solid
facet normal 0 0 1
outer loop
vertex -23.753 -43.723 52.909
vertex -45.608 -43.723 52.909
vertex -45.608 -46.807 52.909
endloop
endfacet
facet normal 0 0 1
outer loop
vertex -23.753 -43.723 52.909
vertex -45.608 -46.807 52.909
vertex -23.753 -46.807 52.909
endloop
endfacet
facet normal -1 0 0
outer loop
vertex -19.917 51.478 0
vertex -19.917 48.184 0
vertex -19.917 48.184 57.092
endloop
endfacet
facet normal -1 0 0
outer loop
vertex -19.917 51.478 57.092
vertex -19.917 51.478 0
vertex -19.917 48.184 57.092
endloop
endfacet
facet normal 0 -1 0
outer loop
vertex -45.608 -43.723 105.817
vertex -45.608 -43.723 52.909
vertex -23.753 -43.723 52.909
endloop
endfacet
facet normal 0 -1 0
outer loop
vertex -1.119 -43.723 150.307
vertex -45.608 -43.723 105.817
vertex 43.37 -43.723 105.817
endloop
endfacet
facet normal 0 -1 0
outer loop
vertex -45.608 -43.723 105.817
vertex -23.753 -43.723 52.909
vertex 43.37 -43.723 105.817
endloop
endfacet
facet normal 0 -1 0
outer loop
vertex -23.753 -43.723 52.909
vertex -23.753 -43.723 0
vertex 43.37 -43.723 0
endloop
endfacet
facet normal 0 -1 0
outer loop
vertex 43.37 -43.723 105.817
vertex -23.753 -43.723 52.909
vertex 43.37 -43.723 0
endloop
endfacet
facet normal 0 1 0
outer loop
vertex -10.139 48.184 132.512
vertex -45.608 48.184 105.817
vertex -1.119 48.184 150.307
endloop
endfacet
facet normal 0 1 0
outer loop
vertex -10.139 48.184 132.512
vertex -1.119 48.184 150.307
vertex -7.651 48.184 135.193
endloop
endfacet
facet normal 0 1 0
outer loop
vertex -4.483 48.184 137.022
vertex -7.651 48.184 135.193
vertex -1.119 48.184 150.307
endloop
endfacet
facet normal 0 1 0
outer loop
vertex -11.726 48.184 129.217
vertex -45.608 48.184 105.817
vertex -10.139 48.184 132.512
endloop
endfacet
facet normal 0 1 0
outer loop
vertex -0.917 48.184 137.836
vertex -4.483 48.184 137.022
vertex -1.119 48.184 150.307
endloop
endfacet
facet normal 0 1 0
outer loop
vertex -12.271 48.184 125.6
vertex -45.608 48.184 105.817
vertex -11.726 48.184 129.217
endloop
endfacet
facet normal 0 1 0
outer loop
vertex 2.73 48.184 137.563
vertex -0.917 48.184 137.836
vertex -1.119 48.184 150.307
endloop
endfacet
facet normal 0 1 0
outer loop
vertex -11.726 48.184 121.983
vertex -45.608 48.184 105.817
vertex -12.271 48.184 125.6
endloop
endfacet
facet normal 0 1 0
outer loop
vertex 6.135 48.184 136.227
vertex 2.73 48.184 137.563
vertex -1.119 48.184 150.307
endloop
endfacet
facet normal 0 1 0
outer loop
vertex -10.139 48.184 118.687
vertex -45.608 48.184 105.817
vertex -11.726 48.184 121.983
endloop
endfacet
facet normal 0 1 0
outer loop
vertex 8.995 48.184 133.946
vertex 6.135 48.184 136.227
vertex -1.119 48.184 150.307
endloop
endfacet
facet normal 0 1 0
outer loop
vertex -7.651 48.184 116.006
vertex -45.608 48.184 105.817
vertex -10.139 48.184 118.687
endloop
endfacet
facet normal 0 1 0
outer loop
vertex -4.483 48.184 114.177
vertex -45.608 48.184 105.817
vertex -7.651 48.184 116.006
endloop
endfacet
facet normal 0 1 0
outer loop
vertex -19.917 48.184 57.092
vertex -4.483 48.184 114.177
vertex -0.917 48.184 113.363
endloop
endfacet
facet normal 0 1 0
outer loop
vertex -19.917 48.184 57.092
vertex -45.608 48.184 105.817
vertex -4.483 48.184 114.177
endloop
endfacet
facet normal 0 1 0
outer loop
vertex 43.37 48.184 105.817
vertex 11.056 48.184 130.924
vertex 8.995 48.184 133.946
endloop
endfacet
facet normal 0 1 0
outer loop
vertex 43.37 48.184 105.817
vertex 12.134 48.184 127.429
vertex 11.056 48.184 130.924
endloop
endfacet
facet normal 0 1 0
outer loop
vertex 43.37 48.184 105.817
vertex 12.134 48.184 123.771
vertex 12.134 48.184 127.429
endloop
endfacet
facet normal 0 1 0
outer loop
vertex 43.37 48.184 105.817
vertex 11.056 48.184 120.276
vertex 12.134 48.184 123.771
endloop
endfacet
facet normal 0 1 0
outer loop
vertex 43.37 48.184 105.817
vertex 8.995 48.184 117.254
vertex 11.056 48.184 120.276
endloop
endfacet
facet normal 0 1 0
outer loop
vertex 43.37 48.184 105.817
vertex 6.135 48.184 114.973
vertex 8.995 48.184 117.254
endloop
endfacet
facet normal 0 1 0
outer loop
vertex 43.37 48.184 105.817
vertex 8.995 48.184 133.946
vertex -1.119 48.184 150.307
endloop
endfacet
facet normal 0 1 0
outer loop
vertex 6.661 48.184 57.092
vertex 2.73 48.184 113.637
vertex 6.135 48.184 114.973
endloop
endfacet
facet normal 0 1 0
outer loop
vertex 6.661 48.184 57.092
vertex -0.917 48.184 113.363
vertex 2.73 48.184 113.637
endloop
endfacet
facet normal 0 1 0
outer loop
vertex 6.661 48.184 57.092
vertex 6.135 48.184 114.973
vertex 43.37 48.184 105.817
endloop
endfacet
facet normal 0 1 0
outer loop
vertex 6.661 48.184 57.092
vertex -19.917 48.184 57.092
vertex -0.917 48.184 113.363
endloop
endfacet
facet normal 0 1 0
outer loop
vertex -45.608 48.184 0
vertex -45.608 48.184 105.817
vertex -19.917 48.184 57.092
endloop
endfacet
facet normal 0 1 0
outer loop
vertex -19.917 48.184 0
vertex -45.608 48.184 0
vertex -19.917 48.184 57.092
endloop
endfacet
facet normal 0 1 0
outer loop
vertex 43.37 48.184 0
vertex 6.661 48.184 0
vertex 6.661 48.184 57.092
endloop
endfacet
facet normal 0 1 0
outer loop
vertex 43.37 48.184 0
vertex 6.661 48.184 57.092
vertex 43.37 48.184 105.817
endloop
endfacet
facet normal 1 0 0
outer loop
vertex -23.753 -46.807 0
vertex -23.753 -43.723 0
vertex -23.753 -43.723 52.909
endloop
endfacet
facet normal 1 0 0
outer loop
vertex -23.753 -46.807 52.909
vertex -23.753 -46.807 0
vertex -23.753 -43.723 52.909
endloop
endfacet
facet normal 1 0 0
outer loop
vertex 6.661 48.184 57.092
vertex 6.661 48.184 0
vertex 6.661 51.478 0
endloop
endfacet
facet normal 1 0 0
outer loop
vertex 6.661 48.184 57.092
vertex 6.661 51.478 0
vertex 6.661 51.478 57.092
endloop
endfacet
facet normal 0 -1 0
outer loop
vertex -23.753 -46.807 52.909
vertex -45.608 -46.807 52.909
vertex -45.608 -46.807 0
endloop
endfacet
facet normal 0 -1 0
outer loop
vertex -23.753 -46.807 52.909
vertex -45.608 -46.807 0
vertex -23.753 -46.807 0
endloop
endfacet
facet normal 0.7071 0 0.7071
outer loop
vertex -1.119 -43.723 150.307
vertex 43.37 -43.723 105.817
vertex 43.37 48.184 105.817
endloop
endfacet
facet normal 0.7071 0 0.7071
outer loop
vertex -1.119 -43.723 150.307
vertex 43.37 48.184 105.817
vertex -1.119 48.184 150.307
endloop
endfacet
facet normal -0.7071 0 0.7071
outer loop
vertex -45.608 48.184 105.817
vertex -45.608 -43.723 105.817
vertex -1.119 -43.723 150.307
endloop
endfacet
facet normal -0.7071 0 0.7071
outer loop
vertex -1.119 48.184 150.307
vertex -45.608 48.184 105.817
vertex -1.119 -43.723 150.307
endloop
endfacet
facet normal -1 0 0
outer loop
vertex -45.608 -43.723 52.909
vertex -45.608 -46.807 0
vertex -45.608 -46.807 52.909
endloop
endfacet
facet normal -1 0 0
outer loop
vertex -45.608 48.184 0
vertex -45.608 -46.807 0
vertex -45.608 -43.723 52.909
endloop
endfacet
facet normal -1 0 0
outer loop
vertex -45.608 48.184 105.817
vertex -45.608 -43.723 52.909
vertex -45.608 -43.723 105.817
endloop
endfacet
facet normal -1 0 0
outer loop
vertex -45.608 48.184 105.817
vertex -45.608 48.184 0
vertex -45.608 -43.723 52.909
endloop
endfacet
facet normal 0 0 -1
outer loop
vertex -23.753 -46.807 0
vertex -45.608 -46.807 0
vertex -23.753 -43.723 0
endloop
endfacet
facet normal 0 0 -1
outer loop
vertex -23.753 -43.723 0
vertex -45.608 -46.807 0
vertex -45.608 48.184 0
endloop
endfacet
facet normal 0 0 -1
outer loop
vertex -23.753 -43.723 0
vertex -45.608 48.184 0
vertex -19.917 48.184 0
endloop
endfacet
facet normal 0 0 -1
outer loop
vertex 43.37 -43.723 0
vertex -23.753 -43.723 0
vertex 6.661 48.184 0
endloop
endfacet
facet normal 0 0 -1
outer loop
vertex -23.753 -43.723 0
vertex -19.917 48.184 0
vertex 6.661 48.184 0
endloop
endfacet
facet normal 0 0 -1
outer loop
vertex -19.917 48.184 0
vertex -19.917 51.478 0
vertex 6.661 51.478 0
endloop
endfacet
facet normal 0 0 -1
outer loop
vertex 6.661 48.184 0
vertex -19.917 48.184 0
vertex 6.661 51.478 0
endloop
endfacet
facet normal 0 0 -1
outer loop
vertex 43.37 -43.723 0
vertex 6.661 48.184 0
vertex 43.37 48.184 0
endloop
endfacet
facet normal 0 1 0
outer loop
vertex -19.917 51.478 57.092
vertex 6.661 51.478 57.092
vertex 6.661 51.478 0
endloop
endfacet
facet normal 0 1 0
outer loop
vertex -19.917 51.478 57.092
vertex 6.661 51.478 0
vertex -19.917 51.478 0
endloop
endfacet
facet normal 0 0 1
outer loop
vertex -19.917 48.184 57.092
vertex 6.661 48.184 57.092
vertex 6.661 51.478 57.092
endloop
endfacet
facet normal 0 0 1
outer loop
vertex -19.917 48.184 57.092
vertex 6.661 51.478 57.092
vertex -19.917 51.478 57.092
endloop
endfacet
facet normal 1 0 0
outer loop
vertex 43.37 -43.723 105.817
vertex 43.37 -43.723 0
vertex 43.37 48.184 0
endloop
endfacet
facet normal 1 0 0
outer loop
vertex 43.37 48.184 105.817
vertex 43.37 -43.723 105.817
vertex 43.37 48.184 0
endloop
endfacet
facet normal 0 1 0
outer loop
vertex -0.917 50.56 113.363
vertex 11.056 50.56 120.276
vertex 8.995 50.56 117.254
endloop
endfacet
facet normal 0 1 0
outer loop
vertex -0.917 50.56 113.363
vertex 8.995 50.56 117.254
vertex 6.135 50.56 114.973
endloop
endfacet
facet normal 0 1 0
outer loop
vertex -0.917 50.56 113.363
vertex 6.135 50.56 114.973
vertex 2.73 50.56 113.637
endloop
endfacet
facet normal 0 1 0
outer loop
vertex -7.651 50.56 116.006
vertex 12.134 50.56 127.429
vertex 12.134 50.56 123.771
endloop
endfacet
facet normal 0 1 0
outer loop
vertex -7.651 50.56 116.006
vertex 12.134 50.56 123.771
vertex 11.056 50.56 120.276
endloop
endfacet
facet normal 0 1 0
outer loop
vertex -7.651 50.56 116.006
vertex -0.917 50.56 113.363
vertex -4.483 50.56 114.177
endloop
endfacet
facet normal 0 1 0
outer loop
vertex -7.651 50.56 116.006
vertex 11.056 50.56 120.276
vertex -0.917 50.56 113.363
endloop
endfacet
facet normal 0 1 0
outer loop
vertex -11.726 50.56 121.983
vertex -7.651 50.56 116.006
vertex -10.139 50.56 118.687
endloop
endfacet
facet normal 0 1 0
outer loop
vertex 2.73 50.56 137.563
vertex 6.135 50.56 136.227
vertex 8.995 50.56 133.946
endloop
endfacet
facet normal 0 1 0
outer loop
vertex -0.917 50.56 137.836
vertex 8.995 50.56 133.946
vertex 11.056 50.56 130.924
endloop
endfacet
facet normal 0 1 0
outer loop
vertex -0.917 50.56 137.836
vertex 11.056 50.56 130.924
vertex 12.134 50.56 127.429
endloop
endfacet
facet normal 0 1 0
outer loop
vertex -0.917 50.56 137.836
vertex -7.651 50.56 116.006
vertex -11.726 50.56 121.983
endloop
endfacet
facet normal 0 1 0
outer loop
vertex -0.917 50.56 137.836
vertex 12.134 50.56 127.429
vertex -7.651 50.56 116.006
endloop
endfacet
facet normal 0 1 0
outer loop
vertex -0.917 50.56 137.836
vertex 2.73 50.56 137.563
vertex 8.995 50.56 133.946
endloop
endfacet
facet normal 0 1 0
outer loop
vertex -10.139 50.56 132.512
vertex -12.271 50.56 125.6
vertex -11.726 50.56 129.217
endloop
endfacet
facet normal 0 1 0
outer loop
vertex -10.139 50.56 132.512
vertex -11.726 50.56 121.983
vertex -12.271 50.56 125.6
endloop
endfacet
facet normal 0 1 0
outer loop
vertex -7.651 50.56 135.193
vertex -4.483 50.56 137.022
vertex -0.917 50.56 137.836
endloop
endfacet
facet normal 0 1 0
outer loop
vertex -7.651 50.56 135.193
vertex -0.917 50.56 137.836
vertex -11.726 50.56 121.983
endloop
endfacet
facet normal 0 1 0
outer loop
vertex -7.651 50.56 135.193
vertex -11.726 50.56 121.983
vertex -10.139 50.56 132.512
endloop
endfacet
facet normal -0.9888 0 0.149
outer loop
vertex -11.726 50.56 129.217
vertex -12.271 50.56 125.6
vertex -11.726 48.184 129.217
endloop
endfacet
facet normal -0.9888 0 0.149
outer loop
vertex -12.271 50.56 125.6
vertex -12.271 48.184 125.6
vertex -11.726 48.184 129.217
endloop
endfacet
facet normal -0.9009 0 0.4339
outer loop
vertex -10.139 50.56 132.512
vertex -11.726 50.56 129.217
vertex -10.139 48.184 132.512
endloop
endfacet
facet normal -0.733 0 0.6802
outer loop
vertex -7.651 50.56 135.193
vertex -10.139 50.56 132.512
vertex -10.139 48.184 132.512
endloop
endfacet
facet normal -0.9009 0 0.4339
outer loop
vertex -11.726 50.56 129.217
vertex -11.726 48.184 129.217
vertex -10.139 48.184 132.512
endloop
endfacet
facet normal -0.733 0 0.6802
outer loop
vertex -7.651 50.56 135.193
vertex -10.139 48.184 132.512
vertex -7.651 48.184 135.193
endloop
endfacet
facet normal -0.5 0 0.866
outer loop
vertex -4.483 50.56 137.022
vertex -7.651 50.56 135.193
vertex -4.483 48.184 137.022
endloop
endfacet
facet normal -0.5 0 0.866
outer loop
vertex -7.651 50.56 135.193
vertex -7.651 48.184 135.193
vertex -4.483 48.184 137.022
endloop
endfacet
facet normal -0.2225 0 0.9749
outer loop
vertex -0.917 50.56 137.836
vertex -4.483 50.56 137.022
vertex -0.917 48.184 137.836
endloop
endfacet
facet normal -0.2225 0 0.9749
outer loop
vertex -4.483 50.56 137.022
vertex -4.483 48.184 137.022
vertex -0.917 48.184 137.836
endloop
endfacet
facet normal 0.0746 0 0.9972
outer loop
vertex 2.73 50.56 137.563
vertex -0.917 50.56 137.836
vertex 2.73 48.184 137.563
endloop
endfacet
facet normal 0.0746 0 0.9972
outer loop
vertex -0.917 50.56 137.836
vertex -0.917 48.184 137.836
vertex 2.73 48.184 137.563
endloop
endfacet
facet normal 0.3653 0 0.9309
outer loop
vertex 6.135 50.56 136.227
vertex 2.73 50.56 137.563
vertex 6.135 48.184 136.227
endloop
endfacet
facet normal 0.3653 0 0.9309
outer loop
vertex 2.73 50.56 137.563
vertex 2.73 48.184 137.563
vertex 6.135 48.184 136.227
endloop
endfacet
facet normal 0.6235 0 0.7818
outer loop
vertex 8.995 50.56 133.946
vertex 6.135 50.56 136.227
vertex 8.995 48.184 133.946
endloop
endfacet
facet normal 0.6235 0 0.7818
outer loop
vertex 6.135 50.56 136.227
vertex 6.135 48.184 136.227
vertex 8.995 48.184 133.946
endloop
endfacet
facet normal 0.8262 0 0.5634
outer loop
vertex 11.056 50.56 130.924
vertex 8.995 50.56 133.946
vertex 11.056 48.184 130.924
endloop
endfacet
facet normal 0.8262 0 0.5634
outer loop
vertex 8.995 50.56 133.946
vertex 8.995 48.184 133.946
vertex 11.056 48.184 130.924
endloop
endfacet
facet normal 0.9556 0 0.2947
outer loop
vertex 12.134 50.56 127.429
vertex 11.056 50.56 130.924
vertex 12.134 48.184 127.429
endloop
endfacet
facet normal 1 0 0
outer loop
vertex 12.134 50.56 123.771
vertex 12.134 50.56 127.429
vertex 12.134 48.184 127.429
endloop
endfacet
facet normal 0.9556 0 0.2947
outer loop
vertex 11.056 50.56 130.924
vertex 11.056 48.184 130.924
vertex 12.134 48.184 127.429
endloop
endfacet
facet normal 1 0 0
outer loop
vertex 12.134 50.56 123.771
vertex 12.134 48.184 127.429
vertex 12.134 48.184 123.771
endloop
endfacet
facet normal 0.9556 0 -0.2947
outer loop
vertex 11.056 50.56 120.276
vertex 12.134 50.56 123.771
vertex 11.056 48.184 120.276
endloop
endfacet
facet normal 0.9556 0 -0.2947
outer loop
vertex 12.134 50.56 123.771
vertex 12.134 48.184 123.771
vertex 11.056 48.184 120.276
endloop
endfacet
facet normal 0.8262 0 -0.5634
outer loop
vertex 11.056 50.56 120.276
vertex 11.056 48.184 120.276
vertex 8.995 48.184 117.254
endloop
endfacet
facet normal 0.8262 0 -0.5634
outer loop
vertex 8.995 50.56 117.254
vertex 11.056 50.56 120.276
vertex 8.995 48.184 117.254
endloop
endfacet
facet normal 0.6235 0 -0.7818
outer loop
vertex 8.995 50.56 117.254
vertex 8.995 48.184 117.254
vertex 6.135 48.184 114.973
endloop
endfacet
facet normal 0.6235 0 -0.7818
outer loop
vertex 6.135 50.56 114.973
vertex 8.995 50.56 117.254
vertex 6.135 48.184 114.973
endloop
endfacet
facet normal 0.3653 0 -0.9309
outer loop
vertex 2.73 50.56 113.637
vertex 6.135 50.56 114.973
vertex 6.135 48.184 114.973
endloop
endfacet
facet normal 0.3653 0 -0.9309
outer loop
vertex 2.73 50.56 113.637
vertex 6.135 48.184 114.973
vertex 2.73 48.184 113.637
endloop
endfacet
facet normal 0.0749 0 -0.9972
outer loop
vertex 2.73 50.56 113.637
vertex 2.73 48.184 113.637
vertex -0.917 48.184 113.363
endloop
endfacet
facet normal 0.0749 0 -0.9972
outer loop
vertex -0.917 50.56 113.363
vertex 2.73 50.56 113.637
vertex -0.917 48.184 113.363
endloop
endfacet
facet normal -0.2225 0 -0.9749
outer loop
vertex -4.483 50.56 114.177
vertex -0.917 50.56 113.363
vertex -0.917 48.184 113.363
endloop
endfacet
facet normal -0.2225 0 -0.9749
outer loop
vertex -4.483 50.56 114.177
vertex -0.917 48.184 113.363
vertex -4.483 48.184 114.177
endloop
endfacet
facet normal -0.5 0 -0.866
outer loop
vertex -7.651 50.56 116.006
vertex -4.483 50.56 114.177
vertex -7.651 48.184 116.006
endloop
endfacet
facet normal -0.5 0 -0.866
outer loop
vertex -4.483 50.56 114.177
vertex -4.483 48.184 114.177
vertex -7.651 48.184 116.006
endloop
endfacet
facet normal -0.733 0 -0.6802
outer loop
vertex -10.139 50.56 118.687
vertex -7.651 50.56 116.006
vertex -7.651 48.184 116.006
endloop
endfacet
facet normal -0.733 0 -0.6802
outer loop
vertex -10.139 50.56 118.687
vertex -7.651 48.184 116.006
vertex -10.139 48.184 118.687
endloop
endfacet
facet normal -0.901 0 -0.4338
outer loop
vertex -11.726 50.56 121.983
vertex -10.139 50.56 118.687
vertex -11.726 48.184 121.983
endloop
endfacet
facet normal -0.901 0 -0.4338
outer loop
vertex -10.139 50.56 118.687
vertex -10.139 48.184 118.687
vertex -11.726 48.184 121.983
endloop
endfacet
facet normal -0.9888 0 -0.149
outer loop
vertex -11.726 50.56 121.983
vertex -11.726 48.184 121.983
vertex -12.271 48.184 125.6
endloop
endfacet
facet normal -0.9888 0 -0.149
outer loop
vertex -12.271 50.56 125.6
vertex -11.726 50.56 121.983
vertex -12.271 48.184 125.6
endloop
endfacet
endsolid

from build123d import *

# Parameters (mm, degrees)
F0_W        = 88.978625834
F0_H        = 91.9070094824
F1_DEPTH    = 92.0228585601
F2_W        = 88.978625834
F2_H        = 91.9070094824
F3_DEPTH    = 64.5945444703
F4_T1_DEPTH = 353.1900010597
F5_W        = 26.5779765323
F5_H        = 57.0915937424
F6_DEPTH    = 3.2936800271
F8_W        = 21.8550208956
F8_H        = 52.9087015152
F9_DEPTH    = 3.0834991485
F10_R       = 12.2707310255
F11_DEPTH   = 1.7256960273
F12_DEPTH   = 0.6503686309


# Not quite as in the source:
# - a fillet or chamfer that OpenCascade refuses, or shapes differently, is made with other operations: its cross-section is extruded or revolved along the edge and cut away or added


with BuildPart() as f1:
    # F0 (on Top) → F1 (new body)
    with BuildSketch(Plane.XY):
        with Locations((-1.1190511286, 2.2303946316)):
            Rectangle(F0_W, F0_H)
    extrude(amount=F1_DEPTH)

    # F2 (on face) → F3 (join)
    with BuildSketch(Plane.XY.offset(92.0228585601)):
        with Locations((-1.1190511286, 2.2303946316)):
            Rectangle(F2_W, F2_H)
    extrude(amount=F3_DEPTH)

    # F4: chamfer of 50.8 on 2 edges, made by hand

    # F4_s2 → F4_t1 (cut)
    with BuildSketch(Plane.XZ.offset(-178.8253951615)):
        Polygon((-45.6083640456, 105.8174030304), (5.1916359544, 156.6174030304), (-45.6083640456, 156.6174030304), align=None)
        Polygon((43.3702617884, 105.8174030304), (-7.4297382116, 156.6174030304), (43.3702617884, 156.6174030304), align=None)
    extrude(amount=F4_T1_DEPTH, mode=Mode.SUBTRACT)

    # F5 (on face) → F6 (join)
    with BuildSketch(Plane(origin=(0, 48.1838993728, 0), x_dir=(-1, 0, 0), z_dir=(0, 1, 0))):
        with Locations((6.6281720065, 28.5457968712)):
            Rectangle(F5_W, F5_H)
    extrude(amount=F6_DEPTH)

    # F8 (on face) → F9 (join)
    with BuildSketch(Plane.XZ.offset(43.7231101096)):
        with Locations((-34.6808535978, 26.4543507576)):
            Rectangle(F8_W, F8_H)
    extrude(amount=F9_DEPTH)

    # F10 (on face) → F11 (join)
    with BuildSketch(Plane(origin=(0, 48.1838993728, 0), x_dir=(-1, 0, 0), z_dir=(0, 1, 0))):
        with Locations((0, 125.5997568369)):
            Circle(F10_R)
    extrude(amount=F11_DEPTH)

    # F12 (add): a face of the model
    f12_faces = [f1.faces().sort_by_distance(p)[0] for p in [
        (0, 49.9095954001, 125.5997568369),
    ]]
    extrude(f12_faces, amount=F12_DEPTH)


solid = f1.part
